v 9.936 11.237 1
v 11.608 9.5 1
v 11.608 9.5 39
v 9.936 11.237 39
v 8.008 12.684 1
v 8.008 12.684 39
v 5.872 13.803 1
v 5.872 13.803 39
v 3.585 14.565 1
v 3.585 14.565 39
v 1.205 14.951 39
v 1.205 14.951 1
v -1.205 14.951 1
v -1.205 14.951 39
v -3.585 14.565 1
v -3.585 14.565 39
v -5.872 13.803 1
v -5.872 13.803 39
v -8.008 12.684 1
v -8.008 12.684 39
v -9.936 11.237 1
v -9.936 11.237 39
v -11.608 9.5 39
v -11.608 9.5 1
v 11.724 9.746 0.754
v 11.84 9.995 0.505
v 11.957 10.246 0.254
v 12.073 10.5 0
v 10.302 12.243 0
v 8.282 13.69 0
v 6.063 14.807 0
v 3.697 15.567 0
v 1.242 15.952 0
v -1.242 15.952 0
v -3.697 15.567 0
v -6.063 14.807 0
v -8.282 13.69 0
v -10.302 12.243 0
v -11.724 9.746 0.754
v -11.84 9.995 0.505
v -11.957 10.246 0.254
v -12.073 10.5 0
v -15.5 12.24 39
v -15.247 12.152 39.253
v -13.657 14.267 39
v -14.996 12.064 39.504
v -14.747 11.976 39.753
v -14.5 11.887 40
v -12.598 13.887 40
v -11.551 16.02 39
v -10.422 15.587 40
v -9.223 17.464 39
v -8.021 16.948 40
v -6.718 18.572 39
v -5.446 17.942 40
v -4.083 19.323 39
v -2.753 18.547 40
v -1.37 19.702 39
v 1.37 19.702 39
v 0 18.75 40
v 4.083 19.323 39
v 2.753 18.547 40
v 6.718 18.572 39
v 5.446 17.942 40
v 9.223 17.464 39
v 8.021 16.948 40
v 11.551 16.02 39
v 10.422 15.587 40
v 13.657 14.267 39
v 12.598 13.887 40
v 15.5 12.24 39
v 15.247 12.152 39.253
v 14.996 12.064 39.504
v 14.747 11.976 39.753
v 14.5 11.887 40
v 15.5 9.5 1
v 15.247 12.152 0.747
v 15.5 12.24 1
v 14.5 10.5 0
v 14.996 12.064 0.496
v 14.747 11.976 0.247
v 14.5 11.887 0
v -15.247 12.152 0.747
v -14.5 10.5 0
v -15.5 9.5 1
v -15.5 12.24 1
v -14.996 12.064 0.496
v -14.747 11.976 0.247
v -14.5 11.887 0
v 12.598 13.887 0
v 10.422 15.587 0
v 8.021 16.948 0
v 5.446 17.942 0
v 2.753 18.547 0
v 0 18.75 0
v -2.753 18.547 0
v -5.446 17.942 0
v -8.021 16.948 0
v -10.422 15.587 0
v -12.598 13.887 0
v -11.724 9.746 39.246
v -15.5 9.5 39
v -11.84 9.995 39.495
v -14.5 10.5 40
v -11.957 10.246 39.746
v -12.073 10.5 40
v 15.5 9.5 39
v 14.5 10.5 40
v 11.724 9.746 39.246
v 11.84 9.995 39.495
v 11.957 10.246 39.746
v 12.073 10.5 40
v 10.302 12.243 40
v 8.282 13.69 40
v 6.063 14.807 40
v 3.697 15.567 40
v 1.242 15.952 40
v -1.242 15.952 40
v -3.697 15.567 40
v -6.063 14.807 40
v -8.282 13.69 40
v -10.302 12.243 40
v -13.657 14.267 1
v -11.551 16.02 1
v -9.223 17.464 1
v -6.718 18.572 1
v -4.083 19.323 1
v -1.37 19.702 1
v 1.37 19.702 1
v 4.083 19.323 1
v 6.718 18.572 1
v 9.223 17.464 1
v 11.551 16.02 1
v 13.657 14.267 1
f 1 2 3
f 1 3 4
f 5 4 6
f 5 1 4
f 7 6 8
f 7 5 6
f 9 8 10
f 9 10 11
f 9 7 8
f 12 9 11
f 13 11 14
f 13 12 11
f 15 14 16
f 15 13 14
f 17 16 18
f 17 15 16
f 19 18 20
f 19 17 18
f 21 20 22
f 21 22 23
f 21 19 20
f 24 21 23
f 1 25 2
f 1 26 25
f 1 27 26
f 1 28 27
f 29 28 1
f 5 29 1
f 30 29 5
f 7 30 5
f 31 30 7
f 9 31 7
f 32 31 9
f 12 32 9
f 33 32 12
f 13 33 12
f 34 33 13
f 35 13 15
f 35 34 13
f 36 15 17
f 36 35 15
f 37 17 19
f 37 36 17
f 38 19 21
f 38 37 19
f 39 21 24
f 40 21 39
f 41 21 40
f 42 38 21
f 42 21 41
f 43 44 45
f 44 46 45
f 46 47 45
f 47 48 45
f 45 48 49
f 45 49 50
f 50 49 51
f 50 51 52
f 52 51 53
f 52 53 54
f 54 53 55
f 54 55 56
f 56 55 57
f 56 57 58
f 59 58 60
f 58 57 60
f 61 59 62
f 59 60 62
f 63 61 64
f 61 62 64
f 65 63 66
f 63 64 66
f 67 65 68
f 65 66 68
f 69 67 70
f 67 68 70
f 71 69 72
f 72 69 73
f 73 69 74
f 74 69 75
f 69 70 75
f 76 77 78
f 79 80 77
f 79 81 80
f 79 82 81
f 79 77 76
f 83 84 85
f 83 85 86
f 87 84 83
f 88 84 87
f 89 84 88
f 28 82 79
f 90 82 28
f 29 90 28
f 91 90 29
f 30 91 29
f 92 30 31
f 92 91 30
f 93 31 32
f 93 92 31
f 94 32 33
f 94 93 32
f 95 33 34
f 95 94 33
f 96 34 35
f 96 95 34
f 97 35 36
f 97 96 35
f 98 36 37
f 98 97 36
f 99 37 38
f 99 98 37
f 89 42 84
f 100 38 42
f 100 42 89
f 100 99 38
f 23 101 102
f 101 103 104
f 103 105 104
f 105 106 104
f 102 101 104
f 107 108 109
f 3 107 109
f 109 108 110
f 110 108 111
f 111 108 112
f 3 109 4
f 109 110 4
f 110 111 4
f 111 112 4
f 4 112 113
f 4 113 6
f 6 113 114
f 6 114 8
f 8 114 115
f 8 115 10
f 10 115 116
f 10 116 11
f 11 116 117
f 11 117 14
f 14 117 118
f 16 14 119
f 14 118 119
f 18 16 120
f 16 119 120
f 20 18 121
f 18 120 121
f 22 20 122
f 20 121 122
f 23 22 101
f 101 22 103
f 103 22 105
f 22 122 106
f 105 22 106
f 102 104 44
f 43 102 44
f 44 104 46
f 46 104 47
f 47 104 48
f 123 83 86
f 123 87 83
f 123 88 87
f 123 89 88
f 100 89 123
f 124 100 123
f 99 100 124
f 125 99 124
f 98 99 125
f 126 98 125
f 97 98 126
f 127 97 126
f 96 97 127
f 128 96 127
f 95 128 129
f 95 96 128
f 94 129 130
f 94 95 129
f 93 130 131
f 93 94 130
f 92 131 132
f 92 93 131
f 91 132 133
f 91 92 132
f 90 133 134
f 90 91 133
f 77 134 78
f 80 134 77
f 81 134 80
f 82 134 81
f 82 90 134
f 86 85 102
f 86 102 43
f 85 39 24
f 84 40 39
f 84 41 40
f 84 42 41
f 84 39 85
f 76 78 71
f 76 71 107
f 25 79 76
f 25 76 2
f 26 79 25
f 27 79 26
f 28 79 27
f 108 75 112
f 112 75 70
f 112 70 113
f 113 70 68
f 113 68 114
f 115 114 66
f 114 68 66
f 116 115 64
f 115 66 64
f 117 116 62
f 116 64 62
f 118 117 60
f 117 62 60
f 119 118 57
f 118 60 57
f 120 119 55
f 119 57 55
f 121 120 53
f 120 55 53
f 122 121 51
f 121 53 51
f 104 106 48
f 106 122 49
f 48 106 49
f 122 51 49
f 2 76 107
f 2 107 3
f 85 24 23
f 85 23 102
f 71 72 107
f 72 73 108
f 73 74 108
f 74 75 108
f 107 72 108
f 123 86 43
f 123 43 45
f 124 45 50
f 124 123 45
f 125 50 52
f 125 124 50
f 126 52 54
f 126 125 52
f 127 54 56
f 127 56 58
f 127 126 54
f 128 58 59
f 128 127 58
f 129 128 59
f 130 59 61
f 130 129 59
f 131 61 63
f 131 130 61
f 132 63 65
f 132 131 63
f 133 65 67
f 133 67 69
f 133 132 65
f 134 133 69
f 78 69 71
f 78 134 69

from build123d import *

# Parameters (mm, degrees)
BASE_EXTRUSION_DEPTH = 40
CHANFREIN1_SIZE      = 1


with BuildPart() as part:
    # Esquisse1 → Base-Extrusion (new body)
    with BuildSketch(Plane.XY):
        with BuildLine():
            Line((15.5, 12.239791665), (15.5, 9.5))
            Line((15.5, 9.5), (11.608186766, 9.5))
            ThreePointArc((11.608186766, 9.5), (0, 15), (-11.608186766, 9.5))
            Line((-11.608186766, 9.5), (-15.5, 9.5))
            Line((-15.5, 9.5), (-15.5, 12.239791665))
            ThreePointArc((-15.5, 12.239791665), (0, 19.75), (15.5, 12.239791665))
        make_face()
    extrude(amount=BASE_EXTRUSION_DEPTH)

    # Chanfrein1
    chanfrein1_edges = [part.edges().sort_by_distance(p)[0] for p in [
        (15.5, 10.869895832, 0),
        (15.5, 10.869895832, 40),
        (13.554093383, 9.5, 0),
        (13.554093383, 9.5, 40),
        (0, 15, 0),
        (0, 15, 40),
        (-13.554093383, 9.5, 0),
        (-13.554093383, 9.5, 40),
        (-15.5, 10.869895832, 0),
        (-15.5, 10.869895832, 40),
        (0, 19.75, 0),
        (0, 19.75, 40),
    ]]
    chamfer(chanfrein1_edges, length=CHANFREIN1_SIZE)


solid = part.part
